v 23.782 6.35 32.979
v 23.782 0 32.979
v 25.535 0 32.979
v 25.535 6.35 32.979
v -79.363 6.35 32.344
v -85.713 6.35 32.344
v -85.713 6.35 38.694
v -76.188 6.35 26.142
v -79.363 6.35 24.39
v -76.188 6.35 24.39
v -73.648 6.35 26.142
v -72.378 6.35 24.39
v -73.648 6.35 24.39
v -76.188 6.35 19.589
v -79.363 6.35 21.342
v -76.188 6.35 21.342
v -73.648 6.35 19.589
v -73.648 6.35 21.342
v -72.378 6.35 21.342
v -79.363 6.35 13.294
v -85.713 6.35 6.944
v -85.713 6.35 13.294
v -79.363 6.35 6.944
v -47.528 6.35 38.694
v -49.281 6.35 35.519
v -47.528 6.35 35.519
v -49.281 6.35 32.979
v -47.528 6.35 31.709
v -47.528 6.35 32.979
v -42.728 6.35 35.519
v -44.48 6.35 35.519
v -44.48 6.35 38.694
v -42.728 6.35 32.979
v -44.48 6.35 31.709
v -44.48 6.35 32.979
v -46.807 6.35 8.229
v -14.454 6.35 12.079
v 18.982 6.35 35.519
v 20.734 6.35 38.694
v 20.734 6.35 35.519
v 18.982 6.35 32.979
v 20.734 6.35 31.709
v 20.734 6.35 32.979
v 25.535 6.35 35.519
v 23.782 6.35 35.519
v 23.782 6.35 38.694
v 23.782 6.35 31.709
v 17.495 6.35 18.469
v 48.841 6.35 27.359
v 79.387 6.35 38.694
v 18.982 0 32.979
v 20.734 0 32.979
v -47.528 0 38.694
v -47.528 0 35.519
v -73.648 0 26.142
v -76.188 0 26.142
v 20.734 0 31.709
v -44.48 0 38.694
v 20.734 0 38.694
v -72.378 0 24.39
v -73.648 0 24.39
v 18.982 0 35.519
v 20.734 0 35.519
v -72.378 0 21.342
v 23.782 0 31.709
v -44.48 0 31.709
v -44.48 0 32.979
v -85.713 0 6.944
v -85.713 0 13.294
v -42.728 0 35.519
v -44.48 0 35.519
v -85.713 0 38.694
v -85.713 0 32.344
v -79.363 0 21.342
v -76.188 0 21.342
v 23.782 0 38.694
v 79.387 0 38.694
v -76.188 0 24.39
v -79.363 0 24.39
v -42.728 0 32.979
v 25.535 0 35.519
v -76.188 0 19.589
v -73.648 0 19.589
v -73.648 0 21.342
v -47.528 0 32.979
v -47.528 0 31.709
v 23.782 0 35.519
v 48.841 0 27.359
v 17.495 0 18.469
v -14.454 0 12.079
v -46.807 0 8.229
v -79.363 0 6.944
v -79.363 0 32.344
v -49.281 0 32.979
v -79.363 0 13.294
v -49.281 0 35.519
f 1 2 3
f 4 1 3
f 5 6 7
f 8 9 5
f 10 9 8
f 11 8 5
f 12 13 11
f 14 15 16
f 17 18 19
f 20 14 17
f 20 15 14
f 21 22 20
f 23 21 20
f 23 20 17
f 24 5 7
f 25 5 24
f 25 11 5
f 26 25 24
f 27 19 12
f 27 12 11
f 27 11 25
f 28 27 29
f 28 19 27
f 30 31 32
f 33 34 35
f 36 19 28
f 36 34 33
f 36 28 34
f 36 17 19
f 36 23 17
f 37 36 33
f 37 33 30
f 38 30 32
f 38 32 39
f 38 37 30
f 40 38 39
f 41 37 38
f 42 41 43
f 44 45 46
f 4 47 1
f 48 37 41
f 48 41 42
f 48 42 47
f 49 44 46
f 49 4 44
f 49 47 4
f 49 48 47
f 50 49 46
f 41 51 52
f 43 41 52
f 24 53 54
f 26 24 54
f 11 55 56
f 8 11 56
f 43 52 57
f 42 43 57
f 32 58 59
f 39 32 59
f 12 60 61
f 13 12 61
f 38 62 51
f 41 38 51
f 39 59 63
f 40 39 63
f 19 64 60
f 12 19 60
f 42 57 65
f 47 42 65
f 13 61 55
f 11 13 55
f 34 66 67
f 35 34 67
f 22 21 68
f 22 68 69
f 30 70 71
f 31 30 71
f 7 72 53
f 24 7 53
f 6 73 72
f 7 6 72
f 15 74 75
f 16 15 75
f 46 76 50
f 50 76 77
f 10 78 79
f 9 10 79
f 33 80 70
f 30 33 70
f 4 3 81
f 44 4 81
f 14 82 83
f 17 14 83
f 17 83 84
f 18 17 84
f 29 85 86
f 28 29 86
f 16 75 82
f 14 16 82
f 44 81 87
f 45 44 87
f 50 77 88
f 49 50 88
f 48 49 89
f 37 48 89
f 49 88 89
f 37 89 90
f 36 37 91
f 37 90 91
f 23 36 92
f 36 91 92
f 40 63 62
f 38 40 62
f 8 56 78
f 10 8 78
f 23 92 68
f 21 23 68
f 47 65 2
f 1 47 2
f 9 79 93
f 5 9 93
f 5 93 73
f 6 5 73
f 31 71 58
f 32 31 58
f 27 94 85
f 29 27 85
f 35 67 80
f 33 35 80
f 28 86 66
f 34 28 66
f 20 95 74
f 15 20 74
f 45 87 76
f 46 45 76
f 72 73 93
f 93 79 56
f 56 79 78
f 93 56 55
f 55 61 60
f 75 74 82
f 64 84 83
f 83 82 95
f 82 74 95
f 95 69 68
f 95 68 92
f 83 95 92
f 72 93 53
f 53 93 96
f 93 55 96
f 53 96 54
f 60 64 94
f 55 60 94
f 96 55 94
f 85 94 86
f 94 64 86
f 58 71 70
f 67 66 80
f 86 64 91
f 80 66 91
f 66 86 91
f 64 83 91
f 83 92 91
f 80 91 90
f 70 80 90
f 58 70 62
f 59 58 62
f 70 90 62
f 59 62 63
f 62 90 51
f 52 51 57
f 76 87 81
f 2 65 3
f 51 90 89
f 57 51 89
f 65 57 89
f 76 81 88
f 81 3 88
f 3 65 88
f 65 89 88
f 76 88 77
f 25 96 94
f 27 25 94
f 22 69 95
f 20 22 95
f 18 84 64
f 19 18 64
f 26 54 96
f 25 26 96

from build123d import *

# Parameters (mm, degrees)
BOSS_EXTRUDE1_DEPTH = 6.35


with BuildPart() as part:
    # Sketch1 → Boss-Extrude1 (new body)
    with BuildSketch(Plane(origin=(0, 0, 0), x_dir=(1, 0, 0), z_dir=(0, 1, 0))):
        with BuildLine():
            Line((-79.362966154, -13.293541536), (-79.362966154, -21.341955347))
            Line((-79.362966154, -21.341955347), (-76.187966154, -21.341955347))
            Line((-76.187966154, -21.341955347), (-76.187966154, -19.589355347))
            Line((-76.187966154, -19.589355347), (-73.647966154, -19.589355347))
            Line((-73.647966154, -19.589355347), (-73.647966154, -21.341955347))
            Line((-73.647966154, -21.341955347), (-72.377966154, -21.341955347))
            Line((-72.377966154, -21.341955347), (-72.377966154, -24.389814703))
            Line((-72.377966154, -24.389814703), (-73.647966154, -24.389814703))
            Line((-73.647966154, -24.389814703), (-73.647966154, -26.142414703))
            Line((-73.647966154, -26.142414703), (-76.187966154, -26.142414703))
            Line((-76.187966154, -26.142414703), (-76.187966154, -24.389814703))
            Line((-76.187966154, -24.389814703), (-79.362966154, -24.389814703))
            Line((-79.362966154, -24.389814703), (-79.362966154, -32.343541536))
            Line((-79.362966154, -32.343541536), (-85.712966154, -32.343541536))
            Line((-85.712966154, -32.343541536), (-85.712966154, -38.693541536))
            Line((-85.712966154, -38.693541536), (-79.362966154, -38.693541536))
            Line((-79.362966154, -38.693541536), (-47.528264268, -38.693541536))
            Line((-47.528264268, -38.693541536), (-47.528264268, -35.518541536))
            Line((-47.528264268, -35.518541536), (-49.280864268, -35.518541536))
            Line((-49.280864268, -35.518541536), (-49.280864268, -32.978541536))
            Line((-49.280864268, -32.978541536), (-47.528264268, -32.978541536))
            Line((-47.528264268, -32.978541536), (-47.528264268, -31.708541536))
            Line((-47.528264268, -31.708541536), (-44.480404912, -31.708541536))
            Line((-44.480404912, -31.708541536), (-44.480404912, -32.978541536))
            Line((-44.480404912, -32.978541536), (-42.727804912, -32.978541536))
            Line((-42.727804912, -32.978541536), (-42.727804912, -35.518541536))
            Line((-42.727804912, -35.518541536), (-44.480404912, -35.518541536))
            Line((-44.480404912, -35.518541536), (-44.480404912, -38.693541536))
            Line((-44.480404912, -38.693541536), (20.734235732, -38.693541536))
            Line((20.734235732, -38.693541536), (20.734235732, -35.518541536))
            Line((20.734235732, -35.518541536), (18.981635732, -35.518541536))
            Line((18.981635732, -35.518541536), (18.981635732, -32.978541536))
            Line((18.981635732, -32.978541536), (20.734235732, -32.978541536))
            Line((20.734235732, -32.978541536), (20.734235732, -31.708541536))
            Line((20.734235732, -31.708541536), (23.782095088, -31.708541536))
            Line((23.782095088, -31.708541536), (23.782095088, -32.978541536))
            Line((23.782095088, -32.978541536), (25.534695088, -32.978541536))
            Line((25.534695088, -32.978541536), (25.534695088, -35.518541536))
            Line((25.534695088, -35.518541536), (23.782095088, -35.518541536))
            Line((23.782095088, -35.518541536), (23.782095088, -38.693541536))
            Line((23.782095088, -38.693541536), (79.387033846, -38.693541536))
            ThreePointArc((79.387033846, -38.693541536), (1.583968625, -14.958867645), (-79.362966154, -6.943541536))
            Line((-79.362966154, -6.943541536), (-85.712966154, -6.943541536))
            Line((-85.712966154, -6.943541536), (-85.712966154, -13.293541536))
            Line((-85.712966154, -13.293541536), (-79.362966154, -13.293541536))
        make_face()
    extrude(amount=BOSS_EXTRUDE1_DEPTH)


solid = part.part
